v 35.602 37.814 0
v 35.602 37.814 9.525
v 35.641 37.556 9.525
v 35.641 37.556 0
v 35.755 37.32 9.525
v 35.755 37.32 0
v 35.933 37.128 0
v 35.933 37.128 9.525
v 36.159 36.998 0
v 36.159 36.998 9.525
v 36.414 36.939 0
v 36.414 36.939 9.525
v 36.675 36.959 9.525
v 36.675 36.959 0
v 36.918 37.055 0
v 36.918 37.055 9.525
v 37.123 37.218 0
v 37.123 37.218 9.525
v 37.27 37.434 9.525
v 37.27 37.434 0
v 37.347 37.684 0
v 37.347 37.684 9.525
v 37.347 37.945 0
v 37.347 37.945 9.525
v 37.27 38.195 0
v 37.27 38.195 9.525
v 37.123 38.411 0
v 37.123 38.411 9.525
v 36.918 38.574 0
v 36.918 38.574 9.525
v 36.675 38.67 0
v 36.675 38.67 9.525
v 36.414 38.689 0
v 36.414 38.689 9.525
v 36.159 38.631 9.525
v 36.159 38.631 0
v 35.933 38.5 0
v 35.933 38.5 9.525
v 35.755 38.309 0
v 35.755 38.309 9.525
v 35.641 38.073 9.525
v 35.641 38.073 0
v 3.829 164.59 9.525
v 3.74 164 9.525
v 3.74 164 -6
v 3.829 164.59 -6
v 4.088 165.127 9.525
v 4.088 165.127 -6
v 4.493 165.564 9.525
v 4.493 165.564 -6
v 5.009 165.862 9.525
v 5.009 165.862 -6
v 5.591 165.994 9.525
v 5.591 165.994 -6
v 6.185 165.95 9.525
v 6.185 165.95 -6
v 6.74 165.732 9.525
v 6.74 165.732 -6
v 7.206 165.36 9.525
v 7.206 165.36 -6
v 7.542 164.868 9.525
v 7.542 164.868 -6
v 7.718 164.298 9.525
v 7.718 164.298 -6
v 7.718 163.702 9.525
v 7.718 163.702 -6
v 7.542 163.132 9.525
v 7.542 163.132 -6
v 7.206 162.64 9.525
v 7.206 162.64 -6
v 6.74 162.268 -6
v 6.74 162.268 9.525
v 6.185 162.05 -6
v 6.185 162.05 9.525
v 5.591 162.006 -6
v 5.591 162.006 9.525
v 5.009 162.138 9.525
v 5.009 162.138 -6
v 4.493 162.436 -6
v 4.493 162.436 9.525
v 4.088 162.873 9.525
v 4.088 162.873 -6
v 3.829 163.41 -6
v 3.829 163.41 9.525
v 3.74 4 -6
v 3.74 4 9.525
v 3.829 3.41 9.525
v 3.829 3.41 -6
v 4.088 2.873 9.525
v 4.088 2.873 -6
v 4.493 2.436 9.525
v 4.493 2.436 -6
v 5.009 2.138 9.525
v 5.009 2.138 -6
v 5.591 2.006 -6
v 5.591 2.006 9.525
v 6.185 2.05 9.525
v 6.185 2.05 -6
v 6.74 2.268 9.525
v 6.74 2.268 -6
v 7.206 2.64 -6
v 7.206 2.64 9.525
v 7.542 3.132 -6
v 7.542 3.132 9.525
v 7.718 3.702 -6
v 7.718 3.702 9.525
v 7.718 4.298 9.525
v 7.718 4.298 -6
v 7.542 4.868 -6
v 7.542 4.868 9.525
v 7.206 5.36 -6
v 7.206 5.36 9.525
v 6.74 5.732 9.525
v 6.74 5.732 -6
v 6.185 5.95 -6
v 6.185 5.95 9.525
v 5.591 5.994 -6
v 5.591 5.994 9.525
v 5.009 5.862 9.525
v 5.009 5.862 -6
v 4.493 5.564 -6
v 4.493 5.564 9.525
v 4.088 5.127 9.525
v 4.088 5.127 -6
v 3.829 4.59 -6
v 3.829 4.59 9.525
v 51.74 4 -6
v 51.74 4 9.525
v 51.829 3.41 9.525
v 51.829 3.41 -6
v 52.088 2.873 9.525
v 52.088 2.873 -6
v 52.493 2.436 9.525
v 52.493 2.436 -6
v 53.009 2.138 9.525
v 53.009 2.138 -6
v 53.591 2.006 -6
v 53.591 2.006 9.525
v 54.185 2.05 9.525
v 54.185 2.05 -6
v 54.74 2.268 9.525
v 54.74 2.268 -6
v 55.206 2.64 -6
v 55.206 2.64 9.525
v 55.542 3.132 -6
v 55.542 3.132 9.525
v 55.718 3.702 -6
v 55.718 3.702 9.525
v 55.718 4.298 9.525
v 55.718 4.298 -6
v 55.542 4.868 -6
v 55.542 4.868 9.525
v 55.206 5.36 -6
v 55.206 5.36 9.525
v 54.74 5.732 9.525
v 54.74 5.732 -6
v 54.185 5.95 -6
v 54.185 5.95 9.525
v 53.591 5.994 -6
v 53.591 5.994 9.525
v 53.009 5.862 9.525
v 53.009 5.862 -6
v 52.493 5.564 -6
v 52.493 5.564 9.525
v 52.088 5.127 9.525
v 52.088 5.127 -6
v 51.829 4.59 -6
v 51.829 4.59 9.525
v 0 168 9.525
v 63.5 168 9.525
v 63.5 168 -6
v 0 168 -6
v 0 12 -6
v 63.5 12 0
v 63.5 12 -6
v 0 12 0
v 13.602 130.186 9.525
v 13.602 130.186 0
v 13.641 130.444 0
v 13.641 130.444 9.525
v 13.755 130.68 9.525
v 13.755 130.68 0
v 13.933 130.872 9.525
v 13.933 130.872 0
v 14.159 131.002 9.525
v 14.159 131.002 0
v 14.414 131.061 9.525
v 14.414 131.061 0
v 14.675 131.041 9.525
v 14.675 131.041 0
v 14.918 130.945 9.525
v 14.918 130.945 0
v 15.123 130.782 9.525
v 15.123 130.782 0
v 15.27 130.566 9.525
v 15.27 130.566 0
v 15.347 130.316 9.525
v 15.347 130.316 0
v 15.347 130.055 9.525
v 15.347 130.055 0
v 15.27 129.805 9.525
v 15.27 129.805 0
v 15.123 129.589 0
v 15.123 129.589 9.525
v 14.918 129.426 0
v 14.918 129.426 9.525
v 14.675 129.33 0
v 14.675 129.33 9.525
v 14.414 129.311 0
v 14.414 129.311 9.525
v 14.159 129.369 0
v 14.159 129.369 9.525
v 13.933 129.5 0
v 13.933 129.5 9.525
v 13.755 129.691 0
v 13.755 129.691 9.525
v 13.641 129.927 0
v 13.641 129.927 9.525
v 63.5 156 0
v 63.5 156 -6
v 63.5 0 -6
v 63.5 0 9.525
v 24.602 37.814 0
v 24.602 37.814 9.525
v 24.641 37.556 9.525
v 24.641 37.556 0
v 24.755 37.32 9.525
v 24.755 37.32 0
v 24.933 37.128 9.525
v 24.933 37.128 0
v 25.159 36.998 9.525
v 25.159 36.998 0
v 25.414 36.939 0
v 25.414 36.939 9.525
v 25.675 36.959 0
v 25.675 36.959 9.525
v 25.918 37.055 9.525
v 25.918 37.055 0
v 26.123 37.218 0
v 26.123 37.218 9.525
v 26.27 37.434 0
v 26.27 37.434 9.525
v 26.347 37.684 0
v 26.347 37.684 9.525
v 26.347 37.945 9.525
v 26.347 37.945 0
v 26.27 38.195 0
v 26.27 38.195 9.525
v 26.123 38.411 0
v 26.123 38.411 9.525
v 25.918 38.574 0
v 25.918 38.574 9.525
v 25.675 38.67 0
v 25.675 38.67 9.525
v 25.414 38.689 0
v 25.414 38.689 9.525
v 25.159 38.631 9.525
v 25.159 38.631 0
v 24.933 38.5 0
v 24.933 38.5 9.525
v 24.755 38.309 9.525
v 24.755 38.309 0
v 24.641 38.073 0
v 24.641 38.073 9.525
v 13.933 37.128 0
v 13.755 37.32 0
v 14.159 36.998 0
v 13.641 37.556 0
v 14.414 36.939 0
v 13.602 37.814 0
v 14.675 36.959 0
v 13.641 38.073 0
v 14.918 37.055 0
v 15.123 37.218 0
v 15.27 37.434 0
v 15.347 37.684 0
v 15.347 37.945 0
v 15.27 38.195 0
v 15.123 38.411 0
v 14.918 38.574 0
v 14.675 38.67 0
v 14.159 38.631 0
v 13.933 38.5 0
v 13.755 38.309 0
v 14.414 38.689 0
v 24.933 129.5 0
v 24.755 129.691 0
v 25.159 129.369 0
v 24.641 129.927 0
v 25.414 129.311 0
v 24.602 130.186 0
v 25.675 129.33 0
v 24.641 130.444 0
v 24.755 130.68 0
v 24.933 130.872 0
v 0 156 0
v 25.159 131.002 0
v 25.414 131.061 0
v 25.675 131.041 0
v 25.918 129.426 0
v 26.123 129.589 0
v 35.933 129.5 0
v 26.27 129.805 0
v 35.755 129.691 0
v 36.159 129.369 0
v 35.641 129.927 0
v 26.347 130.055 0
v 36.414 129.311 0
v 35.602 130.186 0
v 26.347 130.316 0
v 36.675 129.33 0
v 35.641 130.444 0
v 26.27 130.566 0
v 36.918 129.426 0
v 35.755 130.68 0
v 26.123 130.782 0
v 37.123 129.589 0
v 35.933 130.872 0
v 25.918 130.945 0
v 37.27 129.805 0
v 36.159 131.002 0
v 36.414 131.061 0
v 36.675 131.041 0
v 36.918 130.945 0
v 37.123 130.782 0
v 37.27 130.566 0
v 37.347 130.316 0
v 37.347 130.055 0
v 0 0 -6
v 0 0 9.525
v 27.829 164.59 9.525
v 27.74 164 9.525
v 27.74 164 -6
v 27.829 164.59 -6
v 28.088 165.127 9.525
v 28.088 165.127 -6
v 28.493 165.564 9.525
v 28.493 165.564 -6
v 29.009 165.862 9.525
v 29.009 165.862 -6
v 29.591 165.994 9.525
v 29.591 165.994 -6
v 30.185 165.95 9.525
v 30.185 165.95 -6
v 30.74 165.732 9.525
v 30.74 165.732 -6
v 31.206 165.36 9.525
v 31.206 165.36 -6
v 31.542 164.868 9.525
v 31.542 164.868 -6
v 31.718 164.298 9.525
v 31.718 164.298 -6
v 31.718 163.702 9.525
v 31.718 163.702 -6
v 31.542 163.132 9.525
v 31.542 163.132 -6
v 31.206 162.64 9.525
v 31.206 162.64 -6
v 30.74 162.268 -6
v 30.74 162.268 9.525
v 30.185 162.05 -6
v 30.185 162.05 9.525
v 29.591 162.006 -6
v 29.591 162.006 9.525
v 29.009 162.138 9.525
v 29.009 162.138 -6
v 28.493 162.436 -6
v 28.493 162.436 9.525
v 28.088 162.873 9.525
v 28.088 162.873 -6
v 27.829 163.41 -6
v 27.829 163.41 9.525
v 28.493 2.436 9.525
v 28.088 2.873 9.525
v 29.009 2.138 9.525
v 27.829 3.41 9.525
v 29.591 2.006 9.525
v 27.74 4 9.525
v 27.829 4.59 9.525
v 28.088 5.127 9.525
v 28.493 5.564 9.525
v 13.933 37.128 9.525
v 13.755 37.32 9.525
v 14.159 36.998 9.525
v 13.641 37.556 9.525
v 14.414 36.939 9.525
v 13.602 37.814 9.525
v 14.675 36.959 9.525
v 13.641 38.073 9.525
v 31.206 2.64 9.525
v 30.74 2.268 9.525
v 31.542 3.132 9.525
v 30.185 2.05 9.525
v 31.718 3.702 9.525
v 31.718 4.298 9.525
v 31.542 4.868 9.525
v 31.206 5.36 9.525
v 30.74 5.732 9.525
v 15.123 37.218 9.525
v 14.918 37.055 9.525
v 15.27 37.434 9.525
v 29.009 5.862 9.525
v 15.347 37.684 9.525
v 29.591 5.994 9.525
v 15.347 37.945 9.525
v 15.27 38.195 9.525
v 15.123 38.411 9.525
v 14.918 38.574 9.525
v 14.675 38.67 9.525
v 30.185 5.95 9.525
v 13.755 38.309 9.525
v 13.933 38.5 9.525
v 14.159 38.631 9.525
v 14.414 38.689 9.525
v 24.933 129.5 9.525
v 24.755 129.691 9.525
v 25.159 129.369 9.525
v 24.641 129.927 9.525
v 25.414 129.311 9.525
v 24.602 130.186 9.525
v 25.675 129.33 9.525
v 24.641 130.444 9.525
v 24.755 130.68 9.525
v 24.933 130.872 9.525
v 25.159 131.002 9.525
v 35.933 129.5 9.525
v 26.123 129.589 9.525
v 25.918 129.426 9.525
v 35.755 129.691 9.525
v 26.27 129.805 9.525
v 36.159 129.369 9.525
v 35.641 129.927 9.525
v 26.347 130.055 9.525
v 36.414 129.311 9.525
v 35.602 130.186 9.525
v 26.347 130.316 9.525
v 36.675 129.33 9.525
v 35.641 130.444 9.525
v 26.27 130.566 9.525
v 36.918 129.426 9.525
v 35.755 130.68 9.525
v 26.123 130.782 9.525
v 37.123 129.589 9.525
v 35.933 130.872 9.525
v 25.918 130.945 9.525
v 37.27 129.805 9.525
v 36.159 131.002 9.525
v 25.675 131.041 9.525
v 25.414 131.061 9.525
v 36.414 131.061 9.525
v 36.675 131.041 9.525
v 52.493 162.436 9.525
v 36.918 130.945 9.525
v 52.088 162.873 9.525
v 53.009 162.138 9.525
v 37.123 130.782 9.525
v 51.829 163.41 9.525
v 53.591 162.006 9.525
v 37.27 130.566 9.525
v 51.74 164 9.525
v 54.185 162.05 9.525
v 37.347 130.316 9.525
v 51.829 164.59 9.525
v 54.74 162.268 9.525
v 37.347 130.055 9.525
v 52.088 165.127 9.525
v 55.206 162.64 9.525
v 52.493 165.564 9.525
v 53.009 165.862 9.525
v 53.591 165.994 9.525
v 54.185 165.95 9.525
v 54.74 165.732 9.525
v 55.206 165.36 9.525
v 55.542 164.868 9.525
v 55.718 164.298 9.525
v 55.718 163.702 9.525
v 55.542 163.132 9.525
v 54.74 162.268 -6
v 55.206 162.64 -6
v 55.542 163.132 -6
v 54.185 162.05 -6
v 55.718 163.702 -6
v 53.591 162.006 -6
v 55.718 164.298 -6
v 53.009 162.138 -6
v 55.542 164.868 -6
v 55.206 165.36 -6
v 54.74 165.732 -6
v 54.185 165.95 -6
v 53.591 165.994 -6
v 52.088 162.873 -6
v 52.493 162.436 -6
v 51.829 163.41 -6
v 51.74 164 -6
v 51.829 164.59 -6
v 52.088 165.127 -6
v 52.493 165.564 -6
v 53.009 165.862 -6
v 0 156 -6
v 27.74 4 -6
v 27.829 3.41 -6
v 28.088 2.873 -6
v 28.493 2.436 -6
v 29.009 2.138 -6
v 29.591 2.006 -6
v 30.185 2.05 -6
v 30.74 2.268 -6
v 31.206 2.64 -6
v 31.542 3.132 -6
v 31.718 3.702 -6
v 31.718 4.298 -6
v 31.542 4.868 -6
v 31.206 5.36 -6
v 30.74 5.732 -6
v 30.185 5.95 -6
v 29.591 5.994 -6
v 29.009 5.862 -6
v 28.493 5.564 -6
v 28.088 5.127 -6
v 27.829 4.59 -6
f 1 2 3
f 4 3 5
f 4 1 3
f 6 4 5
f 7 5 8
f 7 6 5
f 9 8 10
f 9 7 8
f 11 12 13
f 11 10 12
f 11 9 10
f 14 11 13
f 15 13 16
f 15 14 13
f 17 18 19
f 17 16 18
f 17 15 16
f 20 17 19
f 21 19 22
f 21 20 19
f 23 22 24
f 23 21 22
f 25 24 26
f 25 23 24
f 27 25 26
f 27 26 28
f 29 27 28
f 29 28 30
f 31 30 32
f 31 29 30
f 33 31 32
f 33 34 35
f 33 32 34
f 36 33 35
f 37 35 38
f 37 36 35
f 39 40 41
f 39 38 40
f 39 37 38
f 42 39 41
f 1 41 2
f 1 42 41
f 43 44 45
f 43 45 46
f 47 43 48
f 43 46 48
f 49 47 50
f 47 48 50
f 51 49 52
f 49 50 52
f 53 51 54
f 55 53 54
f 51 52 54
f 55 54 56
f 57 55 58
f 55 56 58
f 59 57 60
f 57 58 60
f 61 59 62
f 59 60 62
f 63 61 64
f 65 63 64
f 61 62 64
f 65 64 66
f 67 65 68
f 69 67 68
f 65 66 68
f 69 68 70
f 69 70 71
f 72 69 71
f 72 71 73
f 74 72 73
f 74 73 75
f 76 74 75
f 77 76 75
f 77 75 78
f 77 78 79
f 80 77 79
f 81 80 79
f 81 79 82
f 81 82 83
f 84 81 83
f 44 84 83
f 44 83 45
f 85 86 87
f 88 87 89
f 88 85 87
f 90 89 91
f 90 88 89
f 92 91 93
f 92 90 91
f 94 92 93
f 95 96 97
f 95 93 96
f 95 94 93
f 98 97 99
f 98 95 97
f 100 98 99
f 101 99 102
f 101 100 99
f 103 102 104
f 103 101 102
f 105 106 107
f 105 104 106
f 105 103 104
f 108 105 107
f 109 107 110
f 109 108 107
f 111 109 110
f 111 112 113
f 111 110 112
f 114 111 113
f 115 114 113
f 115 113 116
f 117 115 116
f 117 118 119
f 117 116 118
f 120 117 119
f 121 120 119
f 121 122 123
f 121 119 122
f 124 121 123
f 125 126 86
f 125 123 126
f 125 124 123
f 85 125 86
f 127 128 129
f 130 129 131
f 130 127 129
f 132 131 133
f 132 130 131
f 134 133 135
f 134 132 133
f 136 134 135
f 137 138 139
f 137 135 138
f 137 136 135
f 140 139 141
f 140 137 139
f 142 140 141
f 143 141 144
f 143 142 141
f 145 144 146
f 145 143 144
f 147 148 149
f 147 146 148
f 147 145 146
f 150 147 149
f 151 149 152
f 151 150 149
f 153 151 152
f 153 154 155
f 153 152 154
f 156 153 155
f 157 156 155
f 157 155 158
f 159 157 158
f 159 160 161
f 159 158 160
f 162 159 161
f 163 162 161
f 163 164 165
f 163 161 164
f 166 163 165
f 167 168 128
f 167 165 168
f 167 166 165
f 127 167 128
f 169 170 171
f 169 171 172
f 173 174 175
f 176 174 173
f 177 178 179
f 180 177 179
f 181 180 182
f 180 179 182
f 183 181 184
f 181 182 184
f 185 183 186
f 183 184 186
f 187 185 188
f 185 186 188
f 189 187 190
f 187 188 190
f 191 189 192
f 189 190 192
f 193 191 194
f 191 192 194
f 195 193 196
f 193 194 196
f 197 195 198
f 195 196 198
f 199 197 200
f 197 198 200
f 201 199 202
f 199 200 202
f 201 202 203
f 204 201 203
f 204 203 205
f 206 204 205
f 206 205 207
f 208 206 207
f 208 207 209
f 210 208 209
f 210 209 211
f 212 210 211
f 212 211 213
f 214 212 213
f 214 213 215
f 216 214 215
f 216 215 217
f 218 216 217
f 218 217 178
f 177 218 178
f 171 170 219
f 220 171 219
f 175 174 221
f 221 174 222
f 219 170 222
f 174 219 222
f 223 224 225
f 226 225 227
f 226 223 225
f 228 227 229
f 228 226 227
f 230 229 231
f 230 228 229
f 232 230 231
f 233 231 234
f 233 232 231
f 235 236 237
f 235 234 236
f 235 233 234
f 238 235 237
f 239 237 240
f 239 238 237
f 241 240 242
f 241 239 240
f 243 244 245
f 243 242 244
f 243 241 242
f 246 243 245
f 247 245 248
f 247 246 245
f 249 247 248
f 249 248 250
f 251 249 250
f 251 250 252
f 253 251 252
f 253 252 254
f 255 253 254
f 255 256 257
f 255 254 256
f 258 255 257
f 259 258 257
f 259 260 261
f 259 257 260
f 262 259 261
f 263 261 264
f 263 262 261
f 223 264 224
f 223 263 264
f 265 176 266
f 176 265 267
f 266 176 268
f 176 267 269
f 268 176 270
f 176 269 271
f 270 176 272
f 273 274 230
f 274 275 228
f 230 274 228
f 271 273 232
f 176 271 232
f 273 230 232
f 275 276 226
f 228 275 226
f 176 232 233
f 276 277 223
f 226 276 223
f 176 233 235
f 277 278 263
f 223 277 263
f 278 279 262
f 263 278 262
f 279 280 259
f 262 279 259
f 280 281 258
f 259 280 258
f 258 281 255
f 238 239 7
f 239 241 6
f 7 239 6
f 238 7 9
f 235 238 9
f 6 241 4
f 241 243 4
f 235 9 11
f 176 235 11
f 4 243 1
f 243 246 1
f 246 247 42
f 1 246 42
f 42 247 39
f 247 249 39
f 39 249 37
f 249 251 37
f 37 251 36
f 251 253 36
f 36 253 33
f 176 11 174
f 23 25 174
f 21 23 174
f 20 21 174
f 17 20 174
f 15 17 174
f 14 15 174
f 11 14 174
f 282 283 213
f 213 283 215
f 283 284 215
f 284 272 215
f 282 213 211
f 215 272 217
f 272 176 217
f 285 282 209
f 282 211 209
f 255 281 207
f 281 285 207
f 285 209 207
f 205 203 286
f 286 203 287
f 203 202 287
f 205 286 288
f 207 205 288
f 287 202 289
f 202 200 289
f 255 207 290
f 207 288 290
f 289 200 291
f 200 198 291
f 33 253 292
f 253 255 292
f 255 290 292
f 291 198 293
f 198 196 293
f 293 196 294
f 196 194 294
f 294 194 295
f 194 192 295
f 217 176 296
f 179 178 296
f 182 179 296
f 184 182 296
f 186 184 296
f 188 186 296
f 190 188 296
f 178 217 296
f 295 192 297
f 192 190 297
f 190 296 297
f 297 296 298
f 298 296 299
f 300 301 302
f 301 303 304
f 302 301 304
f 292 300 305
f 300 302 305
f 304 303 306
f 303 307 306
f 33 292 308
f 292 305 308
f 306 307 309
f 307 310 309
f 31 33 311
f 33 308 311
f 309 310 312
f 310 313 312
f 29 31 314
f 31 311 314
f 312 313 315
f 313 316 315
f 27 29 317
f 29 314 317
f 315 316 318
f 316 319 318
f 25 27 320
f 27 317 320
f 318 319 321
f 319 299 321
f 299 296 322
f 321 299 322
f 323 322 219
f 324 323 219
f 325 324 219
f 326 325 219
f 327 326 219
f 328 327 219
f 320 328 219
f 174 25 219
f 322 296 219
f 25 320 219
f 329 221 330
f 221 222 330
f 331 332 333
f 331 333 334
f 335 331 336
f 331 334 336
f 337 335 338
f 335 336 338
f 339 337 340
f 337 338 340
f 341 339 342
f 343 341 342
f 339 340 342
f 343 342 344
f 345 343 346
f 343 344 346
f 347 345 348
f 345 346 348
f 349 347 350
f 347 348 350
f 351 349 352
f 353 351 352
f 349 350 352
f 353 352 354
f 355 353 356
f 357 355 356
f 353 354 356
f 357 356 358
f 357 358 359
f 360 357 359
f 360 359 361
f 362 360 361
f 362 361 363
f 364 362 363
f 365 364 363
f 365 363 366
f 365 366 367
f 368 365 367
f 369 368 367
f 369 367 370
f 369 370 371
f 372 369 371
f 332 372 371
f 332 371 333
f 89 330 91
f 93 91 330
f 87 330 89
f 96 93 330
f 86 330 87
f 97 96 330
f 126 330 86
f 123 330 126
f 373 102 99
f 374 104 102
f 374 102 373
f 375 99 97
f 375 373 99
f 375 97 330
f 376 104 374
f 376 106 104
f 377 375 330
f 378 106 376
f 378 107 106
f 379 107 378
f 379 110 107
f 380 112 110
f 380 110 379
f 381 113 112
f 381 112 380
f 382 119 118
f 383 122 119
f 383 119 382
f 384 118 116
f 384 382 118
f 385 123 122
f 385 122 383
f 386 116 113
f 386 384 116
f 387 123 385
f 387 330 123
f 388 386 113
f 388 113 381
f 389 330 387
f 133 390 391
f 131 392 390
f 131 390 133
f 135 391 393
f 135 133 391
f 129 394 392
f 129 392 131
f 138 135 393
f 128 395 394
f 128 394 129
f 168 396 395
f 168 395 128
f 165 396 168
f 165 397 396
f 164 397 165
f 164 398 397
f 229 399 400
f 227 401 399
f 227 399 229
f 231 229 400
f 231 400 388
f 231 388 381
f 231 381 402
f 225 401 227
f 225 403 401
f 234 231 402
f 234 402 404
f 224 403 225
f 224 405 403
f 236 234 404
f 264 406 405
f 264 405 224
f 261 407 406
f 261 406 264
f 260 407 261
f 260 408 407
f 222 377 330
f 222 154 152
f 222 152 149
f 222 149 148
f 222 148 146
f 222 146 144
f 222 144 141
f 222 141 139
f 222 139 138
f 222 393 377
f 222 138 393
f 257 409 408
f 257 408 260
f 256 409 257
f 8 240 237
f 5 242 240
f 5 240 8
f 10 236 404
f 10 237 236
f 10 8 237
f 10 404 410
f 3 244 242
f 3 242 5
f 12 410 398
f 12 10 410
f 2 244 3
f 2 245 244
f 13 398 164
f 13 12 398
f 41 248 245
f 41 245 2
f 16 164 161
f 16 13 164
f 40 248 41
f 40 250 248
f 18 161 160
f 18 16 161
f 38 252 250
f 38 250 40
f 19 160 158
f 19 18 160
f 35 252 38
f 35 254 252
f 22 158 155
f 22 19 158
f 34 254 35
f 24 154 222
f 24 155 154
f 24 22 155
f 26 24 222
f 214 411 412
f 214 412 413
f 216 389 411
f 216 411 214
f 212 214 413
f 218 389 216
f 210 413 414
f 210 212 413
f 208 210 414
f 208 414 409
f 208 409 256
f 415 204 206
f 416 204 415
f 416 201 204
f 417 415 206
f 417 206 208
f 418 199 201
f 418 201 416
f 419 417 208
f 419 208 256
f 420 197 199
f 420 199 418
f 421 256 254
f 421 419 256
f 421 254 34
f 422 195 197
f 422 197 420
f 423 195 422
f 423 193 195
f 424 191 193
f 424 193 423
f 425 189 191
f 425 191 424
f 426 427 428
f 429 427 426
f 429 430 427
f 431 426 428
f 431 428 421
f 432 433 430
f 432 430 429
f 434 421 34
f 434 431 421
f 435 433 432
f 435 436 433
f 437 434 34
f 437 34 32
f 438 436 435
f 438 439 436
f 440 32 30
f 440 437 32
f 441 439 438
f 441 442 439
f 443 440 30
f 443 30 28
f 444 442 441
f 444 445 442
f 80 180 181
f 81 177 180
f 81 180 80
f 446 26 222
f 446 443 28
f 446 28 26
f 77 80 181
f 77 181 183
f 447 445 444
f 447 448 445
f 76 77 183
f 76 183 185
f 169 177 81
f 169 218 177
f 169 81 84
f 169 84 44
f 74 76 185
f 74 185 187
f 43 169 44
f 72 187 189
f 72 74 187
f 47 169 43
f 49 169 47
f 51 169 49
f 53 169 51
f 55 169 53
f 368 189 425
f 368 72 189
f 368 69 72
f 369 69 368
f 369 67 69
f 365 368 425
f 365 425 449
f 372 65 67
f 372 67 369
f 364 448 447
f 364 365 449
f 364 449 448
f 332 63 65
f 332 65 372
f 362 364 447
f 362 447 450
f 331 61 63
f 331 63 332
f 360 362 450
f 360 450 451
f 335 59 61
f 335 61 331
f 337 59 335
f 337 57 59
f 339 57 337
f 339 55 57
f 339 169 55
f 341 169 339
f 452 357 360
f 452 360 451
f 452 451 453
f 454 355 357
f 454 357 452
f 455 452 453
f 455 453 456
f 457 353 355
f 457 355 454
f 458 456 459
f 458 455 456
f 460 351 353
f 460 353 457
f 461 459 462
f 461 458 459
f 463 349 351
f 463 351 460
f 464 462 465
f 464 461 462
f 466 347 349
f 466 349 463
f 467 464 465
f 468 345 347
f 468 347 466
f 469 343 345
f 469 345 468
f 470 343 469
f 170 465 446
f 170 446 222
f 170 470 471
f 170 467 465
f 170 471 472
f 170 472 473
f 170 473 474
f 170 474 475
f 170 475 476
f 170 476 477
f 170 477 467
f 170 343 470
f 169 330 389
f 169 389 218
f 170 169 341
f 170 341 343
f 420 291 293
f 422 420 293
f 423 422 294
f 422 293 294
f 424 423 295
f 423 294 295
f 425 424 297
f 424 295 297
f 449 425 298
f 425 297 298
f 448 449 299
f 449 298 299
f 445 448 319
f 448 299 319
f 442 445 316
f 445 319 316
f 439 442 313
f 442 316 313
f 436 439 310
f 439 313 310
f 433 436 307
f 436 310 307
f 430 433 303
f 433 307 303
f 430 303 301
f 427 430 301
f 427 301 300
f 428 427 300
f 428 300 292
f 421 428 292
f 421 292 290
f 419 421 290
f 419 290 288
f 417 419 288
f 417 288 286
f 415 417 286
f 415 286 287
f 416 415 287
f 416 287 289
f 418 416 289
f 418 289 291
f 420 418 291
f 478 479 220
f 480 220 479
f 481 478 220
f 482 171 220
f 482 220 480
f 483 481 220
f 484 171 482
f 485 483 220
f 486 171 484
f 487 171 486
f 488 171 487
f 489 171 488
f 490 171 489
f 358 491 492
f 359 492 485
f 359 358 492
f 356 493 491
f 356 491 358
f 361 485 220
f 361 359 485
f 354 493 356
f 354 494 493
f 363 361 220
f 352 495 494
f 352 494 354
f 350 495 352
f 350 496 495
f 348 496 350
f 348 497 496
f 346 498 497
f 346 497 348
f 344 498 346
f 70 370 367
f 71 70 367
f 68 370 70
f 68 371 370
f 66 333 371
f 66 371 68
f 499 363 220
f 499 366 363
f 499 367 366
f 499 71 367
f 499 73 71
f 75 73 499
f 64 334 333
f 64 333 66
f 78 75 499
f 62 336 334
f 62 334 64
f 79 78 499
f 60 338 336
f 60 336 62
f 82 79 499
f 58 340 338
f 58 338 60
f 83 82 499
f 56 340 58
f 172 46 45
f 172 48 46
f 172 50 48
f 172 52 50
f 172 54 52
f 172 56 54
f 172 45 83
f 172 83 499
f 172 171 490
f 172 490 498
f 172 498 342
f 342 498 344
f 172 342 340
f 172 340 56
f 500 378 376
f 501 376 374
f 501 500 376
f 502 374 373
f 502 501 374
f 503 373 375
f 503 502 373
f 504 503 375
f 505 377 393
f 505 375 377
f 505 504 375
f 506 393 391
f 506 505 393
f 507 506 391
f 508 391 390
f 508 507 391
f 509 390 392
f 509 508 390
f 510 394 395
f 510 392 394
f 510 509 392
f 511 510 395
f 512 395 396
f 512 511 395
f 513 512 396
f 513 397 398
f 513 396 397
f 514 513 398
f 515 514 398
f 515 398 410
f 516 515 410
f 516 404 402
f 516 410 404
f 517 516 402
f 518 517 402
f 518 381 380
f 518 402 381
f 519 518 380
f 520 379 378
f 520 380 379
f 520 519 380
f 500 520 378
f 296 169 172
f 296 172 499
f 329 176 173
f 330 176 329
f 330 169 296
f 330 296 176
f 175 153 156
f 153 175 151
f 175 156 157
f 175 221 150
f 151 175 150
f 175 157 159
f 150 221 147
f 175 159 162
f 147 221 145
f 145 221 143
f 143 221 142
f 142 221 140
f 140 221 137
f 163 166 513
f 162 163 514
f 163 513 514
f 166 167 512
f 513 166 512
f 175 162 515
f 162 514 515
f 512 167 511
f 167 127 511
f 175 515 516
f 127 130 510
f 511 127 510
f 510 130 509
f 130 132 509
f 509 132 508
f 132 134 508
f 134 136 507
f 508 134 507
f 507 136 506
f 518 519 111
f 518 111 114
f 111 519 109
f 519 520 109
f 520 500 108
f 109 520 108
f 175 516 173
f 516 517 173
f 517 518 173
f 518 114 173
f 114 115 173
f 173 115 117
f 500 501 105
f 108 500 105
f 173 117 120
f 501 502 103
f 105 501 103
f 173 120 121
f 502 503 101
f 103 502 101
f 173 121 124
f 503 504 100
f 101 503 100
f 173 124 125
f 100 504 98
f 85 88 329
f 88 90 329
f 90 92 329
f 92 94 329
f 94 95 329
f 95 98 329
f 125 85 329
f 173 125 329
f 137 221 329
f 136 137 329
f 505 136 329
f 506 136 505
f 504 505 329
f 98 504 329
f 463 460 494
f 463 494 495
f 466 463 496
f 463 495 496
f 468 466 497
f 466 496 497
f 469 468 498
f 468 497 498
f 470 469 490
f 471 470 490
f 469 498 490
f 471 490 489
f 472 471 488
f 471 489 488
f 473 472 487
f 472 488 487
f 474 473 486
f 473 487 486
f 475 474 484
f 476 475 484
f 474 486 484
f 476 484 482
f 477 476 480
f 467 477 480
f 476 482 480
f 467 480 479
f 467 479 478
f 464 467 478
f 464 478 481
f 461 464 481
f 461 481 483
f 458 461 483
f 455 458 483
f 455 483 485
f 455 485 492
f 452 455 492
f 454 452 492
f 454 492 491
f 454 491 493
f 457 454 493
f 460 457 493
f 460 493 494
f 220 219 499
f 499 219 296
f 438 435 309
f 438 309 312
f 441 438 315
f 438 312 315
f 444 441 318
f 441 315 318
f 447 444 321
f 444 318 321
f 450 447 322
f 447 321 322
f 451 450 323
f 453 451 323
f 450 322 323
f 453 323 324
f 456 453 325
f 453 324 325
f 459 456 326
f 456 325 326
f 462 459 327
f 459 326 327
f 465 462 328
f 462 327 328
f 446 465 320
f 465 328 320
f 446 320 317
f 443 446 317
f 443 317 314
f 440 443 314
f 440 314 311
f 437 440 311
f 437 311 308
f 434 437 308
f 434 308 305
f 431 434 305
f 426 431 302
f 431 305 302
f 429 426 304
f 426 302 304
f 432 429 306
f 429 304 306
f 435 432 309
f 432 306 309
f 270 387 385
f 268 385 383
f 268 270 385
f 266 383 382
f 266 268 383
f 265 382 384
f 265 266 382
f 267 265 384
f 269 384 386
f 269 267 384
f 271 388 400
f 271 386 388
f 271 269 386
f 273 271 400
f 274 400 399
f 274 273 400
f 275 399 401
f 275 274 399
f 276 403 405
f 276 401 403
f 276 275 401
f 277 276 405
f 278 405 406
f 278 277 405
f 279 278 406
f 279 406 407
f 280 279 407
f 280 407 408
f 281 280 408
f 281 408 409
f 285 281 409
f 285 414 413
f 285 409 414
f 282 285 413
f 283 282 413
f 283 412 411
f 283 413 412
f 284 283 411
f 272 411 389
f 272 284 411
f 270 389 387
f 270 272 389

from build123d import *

# Parameters (mm, degrees)
SKETCH1_W           = 63.5
SKETCH1_H           = 168
BOSS_EXTRUDE1_DEPTH = 9.525
SKETCH4_W           = 63.5
SKETCH4_H           = 12
BOSS_EXTRUDE2_DEPTH = 6
SKETCH6_R           = 2
CUT_EXTRUDE1_DEPTH  = 181.270007558
SKETCH8_R           = 0.877320143
CUT_EXTRUDE4_DEPTH  = 180.852649758


with BuildPart() as part:
    # Sketch1 → Boss-Extrude1 (new body)
    with BuildSketch(Plane.XY):
        with Locations((31.75, 84)):
            Rectangle(SKETCH1_W, SKETCH1_H)
    extrude(amount=BOSS_EXTRUDE1_DEPTH)

    # Sketch4 → Boss-Extrude2 (add)
    with BuildSketch(Plane(origin=(0, 0, 0), x_dir=(-1, 0, 0), z_dir=(0, 0, -1))):
        with Locations((-31.75, 162)):
            Rectangle(SKETCH4_W, SKETCH4_H)
    boss_extrude2 = extrude(amount=BOSS_EXTRUDE2_DEPTH)

    # Sketch6 → Cut-Extrude1 (cut, through all)
    with BuildSketch(Plane(origin=(0, 0, -6), x_dir=(-1, 0, 0), z_dir=(0, 0, -1))):
        with Locations((-5.74011002, 164)):
            Circle(SKETCH6_R)
        with Locations((-53.74011002, 164)):
            Circle(SKETCH6_R)
        with Locations((-29.74011002, 164)):
            Circle(SKETCH6_R)
    cut_extrude1 = extrude(amount=-CUT_EXTRUDE1_DEPTH, mode=Mode.SUBTRACT)

    # Mirror1: Boss-Extrude2, Cut-Extrude1 across plane
    add(boss_extrude2.mirror(Plane.ZX.offset(84)))
    add(cut_extrude1.mirror(Plane.ZX.offset(84)), mode=Mode.SUBTRACT)

    # Sketch8 → Cut-Extrude4 (cut, symmetric)
    with BuildSketch(Plane(origin=(0, 0, 0), x_dir=(-1, 0, 0), z_dir=(0, 0, -1))):
        with Locations((-14.479670844, 130.185691353)):
            Circle(SKETCH8_R)
        with Locations((-25.479670844, 130.185691353)):
            Circle(SKETCH8_R)
        with Locations((-36.479670844, 130.185691353)):
            Circle(SKETCH8_R)
    cut_extrude4 = extrude(amount=CUT_EXTRUDE4_DEPTH, both=True, mode=Mode.SUBTRACT)

    # Mirror2: Cut-Extrude4 across plane
    add(cut_extrude4.mirror(Plane.ZX.offset(84)), mode=Mode.SUBTRACT)


solid = part.part
